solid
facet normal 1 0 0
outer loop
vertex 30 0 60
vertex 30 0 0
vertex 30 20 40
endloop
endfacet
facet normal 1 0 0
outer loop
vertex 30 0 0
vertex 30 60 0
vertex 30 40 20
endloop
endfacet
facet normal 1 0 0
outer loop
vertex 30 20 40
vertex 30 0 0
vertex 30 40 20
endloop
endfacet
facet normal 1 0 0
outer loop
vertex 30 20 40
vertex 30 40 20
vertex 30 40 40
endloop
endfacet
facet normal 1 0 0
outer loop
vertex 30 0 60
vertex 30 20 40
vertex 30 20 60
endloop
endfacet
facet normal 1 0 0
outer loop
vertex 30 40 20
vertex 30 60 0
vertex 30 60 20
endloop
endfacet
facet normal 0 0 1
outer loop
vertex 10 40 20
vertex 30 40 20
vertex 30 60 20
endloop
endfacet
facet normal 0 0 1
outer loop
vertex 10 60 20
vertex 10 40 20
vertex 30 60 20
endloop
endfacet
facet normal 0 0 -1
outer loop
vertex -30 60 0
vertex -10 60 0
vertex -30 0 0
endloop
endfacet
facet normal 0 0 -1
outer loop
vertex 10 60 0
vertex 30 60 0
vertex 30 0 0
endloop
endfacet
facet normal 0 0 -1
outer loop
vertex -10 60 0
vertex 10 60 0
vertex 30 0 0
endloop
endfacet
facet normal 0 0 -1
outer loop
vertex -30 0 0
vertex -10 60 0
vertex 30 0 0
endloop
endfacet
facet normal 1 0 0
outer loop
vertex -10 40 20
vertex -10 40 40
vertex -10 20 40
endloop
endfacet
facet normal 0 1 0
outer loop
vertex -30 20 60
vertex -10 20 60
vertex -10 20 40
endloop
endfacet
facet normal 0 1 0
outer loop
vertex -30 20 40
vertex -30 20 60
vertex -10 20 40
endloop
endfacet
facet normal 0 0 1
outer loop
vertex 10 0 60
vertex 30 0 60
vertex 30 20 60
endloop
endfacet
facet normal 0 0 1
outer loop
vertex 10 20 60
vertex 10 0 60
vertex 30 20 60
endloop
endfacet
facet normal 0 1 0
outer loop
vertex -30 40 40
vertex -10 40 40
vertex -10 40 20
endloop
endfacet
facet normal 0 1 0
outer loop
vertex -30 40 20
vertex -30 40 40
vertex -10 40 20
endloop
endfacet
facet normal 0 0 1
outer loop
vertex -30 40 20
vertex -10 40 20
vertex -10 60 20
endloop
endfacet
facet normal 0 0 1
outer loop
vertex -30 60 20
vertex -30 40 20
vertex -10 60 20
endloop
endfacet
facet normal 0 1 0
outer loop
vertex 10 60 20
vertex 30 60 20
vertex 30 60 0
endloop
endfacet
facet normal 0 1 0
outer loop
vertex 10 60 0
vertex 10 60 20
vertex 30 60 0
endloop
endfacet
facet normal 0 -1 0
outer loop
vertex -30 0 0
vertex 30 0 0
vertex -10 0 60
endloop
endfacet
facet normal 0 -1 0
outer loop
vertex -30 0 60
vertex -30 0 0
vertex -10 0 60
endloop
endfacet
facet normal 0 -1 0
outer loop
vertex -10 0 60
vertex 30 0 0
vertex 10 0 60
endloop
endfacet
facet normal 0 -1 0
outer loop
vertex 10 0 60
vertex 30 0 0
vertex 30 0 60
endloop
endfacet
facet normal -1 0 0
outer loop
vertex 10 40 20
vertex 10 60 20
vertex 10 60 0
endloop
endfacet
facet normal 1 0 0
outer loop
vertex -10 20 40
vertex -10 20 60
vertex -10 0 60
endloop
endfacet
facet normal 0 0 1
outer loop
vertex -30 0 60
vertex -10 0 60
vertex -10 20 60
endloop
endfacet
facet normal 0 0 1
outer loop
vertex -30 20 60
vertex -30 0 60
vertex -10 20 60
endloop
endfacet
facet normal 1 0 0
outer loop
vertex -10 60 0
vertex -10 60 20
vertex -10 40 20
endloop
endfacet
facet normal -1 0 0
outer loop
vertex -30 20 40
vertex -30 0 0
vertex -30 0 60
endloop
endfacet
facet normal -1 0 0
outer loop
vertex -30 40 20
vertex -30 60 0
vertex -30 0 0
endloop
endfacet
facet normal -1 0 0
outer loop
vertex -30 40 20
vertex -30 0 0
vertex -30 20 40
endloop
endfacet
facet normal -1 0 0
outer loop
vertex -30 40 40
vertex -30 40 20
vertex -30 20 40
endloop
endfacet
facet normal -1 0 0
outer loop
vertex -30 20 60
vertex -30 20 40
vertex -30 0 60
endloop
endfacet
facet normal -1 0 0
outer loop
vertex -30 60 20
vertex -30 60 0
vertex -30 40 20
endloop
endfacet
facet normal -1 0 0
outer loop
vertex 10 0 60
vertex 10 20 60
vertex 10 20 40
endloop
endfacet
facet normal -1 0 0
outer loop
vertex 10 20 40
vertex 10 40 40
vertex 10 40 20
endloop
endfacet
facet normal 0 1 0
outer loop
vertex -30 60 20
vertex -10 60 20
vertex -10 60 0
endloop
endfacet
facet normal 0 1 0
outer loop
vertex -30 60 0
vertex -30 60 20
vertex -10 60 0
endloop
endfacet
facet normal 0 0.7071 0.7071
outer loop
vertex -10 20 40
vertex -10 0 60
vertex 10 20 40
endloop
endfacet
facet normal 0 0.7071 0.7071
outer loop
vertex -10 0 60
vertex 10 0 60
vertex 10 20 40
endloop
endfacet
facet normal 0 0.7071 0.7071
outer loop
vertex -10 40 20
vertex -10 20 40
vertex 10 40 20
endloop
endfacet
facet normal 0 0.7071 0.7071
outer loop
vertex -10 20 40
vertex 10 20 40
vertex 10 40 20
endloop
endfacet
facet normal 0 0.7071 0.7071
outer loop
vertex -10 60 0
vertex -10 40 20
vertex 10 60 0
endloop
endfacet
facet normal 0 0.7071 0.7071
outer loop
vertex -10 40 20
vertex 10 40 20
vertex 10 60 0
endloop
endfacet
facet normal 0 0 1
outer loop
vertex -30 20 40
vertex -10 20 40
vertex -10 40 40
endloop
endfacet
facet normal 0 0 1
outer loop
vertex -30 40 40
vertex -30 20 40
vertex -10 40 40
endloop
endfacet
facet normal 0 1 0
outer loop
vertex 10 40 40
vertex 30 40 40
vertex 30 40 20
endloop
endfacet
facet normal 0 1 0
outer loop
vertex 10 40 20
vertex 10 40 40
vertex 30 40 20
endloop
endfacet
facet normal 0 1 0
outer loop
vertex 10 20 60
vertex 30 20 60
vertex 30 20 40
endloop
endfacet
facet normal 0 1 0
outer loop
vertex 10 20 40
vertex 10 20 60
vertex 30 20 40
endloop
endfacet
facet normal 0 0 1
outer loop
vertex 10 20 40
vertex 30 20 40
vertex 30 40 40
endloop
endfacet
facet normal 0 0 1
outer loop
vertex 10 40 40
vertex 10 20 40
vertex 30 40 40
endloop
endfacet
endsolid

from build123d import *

# Parameters (mm, degrees)
SALIENTE_EXTRUIR1_DEPTH = 30
CORTAR_EXTRUIR1_DEPTH   = 10


with BuildPart() as part:
    # Croquis1 → Saliente-Extruir1 (new body, symmetric)
    with BuildSketch(Plane(origin=(0, 0, 0), x_dir=(0, 0, -1), z_dir=(1, 0, 0))):
        Polygon((0, 0), (-60, 0), (-60, 20), (-40, 20), (-40, 40), (-20, 40), (-20, 60), (0, 60), align=None)
    extrude(amount=SALIENTE_EXTRUIR1_DEPTH, both=True)

    # Croquis2 → Cortar-Extruir1 (cut, symmetric)
    with BuildSketch(Plane(origin=(0, 0, 0), x_dir=(0, 0, -1), z_dir=(1, 0, 0))):
        Polygon((-40, 20), (-20, 40), (-40, 40), align=None)
        Polygon((-60, 0), (-40, 20), (-60, 20), align=None)
        Polygon((-20, 40), (0, 60), (-20, 60), align=None)
    extrude(amount=CORTAR_EXTRUIR1_DEPTH, both=True, mode=Mode.SUBTRACT)


solid = part.part
